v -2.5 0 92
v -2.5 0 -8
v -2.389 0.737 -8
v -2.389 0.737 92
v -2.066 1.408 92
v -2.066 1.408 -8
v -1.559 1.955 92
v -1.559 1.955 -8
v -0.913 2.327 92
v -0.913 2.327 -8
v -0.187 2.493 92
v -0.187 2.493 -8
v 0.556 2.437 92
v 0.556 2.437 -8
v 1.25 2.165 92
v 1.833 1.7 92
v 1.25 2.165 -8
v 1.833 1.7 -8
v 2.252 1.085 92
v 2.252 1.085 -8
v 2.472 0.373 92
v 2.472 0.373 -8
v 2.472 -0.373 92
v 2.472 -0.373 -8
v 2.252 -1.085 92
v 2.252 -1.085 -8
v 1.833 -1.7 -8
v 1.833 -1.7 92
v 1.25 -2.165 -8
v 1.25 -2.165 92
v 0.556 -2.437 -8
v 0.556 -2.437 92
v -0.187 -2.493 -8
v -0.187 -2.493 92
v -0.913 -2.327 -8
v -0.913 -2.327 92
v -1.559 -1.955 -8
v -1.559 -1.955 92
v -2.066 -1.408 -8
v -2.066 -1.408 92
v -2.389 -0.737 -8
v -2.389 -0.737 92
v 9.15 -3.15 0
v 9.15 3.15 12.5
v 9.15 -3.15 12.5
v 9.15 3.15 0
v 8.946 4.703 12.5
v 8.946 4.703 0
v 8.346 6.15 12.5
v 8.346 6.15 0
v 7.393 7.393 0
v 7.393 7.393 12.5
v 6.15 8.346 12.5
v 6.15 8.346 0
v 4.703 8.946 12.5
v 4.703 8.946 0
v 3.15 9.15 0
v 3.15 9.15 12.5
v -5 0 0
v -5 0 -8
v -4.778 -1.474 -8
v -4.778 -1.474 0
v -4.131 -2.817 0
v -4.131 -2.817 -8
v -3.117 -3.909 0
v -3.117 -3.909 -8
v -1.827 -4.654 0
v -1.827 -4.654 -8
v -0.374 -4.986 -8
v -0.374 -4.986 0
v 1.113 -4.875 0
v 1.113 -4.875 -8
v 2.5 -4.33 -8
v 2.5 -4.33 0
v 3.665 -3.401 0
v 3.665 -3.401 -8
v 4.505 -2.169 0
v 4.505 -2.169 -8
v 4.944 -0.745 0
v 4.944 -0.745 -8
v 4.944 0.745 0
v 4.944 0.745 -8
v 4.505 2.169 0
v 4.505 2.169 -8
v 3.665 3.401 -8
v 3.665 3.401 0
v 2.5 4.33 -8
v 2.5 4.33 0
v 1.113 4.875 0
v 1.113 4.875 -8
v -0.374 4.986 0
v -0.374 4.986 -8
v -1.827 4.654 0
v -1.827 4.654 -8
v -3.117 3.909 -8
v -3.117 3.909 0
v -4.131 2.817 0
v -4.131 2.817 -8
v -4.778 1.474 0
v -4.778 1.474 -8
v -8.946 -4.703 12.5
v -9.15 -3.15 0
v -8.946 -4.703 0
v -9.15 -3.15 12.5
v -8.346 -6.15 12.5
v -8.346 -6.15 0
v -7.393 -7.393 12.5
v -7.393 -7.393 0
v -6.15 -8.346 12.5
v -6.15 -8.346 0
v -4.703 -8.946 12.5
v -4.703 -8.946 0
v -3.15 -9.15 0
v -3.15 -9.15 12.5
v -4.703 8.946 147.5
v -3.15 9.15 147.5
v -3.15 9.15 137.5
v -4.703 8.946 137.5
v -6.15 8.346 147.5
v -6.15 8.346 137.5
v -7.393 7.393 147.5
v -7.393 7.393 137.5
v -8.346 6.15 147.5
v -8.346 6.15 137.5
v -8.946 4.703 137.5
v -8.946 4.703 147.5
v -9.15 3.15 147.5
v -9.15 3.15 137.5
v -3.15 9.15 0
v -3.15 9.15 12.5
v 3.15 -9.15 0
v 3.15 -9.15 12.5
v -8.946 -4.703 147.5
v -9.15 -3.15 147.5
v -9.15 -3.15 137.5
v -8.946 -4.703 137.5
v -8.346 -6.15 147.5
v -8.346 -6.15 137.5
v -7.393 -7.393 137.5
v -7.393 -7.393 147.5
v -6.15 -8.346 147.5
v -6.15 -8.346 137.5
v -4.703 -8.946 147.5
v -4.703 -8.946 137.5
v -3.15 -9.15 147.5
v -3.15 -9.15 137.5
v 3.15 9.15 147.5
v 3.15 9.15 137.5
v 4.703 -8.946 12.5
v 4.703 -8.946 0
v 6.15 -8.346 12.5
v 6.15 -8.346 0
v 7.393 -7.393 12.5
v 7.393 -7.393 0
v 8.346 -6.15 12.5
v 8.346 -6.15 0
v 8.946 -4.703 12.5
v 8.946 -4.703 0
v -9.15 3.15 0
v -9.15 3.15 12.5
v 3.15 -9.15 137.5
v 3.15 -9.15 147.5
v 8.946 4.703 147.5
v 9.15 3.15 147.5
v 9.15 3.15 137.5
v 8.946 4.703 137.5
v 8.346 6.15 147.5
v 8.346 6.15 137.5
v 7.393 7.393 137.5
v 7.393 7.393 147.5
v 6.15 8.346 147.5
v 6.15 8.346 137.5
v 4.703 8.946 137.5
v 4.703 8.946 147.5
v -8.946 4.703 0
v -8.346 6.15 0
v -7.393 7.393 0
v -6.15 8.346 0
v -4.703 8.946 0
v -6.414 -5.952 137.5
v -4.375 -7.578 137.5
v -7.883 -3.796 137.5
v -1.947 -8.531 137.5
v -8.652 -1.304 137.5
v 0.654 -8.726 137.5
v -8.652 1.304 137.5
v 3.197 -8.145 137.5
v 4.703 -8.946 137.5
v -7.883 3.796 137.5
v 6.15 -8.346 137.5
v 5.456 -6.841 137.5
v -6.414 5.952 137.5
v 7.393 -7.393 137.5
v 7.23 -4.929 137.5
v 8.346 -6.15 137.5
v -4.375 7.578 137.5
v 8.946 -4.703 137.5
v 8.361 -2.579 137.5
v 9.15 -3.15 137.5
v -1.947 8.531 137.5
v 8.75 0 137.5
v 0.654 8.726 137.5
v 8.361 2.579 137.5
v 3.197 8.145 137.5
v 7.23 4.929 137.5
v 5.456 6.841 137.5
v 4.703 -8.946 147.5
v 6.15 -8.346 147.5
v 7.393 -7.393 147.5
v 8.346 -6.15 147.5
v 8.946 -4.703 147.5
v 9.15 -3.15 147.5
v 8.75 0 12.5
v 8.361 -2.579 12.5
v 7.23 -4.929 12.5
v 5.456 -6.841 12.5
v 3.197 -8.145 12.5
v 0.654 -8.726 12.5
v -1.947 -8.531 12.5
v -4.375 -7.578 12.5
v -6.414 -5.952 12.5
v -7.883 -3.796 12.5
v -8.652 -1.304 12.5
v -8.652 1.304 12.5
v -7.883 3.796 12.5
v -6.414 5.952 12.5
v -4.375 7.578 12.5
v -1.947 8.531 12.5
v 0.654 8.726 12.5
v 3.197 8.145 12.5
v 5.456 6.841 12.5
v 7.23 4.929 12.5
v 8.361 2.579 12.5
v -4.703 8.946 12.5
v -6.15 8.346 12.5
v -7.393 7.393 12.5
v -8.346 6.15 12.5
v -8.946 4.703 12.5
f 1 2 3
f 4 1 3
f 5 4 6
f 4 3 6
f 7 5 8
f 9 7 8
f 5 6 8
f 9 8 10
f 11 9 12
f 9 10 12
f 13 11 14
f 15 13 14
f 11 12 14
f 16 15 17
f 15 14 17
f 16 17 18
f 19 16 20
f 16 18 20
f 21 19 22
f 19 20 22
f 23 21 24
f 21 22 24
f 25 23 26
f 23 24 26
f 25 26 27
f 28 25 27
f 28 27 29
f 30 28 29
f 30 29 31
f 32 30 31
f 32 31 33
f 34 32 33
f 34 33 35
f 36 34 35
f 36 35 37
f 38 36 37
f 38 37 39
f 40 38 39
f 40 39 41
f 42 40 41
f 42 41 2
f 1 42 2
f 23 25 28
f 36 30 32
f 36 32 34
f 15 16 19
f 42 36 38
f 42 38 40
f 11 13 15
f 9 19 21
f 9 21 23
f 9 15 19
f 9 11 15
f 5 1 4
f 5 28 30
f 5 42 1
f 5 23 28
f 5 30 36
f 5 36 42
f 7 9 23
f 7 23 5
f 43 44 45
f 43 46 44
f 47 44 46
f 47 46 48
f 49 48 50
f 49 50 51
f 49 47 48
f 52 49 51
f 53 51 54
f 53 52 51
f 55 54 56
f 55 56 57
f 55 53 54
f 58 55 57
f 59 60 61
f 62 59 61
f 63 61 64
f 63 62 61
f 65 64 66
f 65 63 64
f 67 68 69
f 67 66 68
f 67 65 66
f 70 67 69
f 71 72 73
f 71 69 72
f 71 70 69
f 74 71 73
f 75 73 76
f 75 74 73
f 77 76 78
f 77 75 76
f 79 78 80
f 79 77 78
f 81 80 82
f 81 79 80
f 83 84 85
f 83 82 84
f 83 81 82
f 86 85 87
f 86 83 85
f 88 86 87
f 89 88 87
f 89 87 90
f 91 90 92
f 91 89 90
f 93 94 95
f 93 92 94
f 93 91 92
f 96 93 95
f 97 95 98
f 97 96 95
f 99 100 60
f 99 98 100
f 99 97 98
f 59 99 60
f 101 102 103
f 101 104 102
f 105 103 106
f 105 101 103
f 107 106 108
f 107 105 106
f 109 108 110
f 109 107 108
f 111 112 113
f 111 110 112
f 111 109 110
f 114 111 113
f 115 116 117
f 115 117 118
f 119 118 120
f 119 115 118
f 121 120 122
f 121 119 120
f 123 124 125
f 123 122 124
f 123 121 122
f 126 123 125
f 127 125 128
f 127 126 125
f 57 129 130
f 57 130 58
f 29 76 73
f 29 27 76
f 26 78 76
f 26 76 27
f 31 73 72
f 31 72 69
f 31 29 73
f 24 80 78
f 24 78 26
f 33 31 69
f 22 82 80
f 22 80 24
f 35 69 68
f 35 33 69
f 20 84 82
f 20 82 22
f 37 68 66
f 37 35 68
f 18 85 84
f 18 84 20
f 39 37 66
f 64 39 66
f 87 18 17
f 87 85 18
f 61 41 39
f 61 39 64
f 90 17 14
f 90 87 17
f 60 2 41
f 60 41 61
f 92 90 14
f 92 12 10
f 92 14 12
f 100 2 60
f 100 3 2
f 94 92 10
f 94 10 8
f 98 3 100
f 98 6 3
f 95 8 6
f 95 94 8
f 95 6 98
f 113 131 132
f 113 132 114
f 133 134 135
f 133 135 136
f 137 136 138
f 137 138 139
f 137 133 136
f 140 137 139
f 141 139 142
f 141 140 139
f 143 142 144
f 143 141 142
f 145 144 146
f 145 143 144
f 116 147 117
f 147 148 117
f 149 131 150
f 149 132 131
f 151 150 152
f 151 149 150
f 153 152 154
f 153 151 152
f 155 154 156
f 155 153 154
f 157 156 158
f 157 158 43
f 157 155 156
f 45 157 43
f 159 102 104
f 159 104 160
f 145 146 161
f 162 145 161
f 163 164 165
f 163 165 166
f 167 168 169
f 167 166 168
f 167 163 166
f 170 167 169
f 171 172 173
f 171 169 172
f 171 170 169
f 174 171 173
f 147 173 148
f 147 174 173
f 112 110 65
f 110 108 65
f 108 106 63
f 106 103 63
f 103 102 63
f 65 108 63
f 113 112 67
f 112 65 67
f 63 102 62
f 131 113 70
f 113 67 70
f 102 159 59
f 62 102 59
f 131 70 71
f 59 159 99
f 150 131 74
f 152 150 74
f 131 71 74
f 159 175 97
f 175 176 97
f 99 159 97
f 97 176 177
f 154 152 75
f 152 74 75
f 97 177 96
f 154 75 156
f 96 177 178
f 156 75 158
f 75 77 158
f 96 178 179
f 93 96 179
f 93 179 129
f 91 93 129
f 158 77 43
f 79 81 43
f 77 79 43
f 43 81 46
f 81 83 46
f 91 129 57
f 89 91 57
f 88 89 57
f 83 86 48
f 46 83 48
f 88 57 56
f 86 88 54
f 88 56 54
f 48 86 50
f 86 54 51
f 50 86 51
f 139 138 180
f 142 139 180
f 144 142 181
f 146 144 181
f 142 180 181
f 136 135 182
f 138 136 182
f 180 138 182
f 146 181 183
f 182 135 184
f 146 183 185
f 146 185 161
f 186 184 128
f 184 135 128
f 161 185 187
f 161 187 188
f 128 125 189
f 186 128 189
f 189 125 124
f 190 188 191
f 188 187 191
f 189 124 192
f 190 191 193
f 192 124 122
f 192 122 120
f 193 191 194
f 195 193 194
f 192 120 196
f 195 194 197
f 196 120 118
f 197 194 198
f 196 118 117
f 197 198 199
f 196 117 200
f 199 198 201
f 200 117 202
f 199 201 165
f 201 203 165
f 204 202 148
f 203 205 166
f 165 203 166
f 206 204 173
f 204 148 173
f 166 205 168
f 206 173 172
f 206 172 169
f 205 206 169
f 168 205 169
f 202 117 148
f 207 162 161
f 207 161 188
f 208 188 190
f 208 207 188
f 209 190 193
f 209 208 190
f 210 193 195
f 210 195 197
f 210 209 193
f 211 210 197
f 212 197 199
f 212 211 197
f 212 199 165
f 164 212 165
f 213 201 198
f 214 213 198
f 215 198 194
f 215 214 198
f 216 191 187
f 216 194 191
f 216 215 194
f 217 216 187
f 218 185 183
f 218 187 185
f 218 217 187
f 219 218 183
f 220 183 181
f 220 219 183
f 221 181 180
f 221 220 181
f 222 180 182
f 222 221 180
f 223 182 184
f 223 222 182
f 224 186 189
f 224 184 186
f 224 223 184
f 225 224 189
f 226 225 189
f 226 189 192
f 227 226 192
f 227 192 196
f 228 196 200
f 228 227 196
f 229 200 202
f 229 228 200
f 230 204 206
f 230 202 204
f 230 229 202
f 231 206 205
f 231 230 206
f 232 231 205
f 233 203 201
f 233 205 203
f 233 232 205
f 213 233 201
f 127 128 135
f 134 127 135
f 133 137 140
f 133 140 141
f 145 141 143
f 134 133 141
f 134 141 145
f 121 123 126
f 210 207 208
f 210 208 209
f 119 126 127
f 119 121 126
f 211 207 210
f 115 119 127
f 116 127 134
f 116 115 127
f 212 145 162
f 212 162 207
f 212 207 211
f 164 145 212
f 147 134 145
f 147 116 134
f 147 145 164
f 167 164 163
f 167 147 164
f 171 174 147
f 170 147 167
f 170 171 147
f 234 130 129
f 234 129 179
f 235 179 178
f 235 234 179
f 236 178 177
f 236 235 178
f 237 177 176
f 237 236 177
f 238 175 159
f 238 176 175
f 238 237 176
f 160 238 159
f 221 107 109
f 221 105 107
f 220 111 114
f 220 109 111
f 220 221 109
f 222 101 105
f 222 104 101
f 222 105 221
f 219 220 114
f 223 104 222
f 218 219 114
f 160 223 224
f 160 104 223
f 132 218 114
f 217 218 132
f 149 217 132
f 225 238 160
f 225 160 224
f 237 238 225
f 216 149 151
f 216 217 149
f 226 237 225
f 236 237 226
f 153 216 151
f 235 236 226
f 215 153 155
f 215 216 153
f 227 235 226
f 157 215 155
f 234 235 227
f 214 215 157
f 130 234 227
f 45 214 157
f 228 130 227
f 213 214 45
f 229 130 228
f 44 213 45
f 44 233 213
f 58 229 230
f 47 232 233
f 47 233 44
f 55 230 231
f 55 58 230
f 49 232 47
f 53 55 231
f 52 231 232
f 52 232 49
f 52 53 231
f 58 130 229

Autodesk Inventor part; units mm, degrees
ref_plane "YZ Plane" through (0, 0, 0) normal (1, 0, 0) x (0, 1, 0)
ref_plane "XZ Plane" through (0, 0, 0) normal (0, 1, 0) x (-1, 0, 0)
ref_plane "XY Plane" through (0, 0, 0) normal (0, 0, 1) x (1, 0, 0)
sketch "スケッチ1" plane through (0, 0, 0) normal (0, 0, 1) x (1, 0, 0)
  line L0 (9.15, -9.15) -> (-9.15, -9.15)
  line L1 (-9.15, -9.15) -> (-9.15, 9.15)
  line L2 (-9.15, 9.15) -> (9.15, 9.15)
  line L3 (9.15, 9.15) -> (9.15, -9.15)
  line L4 (9.15, -9.15) -> (-9.15, 9.15) construction
  line L5 (-9.15, -9.15) -> (9.15, 9.15) construction
  point P0 (0, 0)
  dimension "d0" = 18.3
  dimension "d1" = 18.3
extrude "押し出し1" add sketch "スケッチ1" along normal blind 12.5
sketch "スケッチ2" plane through (0, 0, 12.5) normal (0, 0, 1) x (1, 0, 0)
  circle A0 centre (0, 0) radius 8.75
  dimension "d4" = 17.5
extrude "押し出し2" add sketch "スケッチ2" along normal blind 125
sketch "スケッチ3" plane through (0, 0, 137.5) normal (0, 0, 1) x (1, 0, 0)
  line L0 (-9.15, -9.15) -> (9.15, -9.15)
  line L1 (9.15, -9.15) -> (9.15, 9.15)
  line L2 (9.15, 9.15) -> (-9.15, 9.15)
  line L3 (-9.15, 9.15) -> (-9.15, -9.15)
  line L4 (-9.15, -9.15) -> (9.15, 9.15) construction
  line L5 (9.15, -9.15) -> (-9.15, 9.15) construction
  point P0 (0, 0)
  dimension "d7" = 18.3
  dimension "d8" = 18.3
extrude "押し出し3" add sketch "スケッチ3" along normal blind 10
fillet "フィレット1" radius 6 4 edges at (9.15, 9.15, 142.5) (9.15, -9.15, 142.5) (-9.15, 9.15, 142.5) (-9.15, -9.15, 142.5)
fillet "フィレット2" radius 6 4 edges at (9.15, 9.15, 6.25) (9.15, -9.15, 6.25) (-9.15, 9.15, 6.25) (-9.15, -9.15, 6.25)
sketch "スケッチ4" plane through (0, 0, 0) normal (0, 0, -1) x (-1, 0, 0)
  circle A0 centre (0, 0) radius 5
  dimension "d13" = 10
extrude "押し出し4" add sketch "スケッチ4" along normal blind 8
sketch "スケッチ5" plane through (0, 0, -8) normal (0, 0, -1) x (-1, 0, 0)
  circle A0 centre (0, 0) radius 2.5
  dimension "d16" = 5
extrude "押し出し5" cut sketch "スケッチ5" against normal blind 100
properties part number "aircylinder16_100_part1_sa" material "アルミニウム 6061-AHC"
